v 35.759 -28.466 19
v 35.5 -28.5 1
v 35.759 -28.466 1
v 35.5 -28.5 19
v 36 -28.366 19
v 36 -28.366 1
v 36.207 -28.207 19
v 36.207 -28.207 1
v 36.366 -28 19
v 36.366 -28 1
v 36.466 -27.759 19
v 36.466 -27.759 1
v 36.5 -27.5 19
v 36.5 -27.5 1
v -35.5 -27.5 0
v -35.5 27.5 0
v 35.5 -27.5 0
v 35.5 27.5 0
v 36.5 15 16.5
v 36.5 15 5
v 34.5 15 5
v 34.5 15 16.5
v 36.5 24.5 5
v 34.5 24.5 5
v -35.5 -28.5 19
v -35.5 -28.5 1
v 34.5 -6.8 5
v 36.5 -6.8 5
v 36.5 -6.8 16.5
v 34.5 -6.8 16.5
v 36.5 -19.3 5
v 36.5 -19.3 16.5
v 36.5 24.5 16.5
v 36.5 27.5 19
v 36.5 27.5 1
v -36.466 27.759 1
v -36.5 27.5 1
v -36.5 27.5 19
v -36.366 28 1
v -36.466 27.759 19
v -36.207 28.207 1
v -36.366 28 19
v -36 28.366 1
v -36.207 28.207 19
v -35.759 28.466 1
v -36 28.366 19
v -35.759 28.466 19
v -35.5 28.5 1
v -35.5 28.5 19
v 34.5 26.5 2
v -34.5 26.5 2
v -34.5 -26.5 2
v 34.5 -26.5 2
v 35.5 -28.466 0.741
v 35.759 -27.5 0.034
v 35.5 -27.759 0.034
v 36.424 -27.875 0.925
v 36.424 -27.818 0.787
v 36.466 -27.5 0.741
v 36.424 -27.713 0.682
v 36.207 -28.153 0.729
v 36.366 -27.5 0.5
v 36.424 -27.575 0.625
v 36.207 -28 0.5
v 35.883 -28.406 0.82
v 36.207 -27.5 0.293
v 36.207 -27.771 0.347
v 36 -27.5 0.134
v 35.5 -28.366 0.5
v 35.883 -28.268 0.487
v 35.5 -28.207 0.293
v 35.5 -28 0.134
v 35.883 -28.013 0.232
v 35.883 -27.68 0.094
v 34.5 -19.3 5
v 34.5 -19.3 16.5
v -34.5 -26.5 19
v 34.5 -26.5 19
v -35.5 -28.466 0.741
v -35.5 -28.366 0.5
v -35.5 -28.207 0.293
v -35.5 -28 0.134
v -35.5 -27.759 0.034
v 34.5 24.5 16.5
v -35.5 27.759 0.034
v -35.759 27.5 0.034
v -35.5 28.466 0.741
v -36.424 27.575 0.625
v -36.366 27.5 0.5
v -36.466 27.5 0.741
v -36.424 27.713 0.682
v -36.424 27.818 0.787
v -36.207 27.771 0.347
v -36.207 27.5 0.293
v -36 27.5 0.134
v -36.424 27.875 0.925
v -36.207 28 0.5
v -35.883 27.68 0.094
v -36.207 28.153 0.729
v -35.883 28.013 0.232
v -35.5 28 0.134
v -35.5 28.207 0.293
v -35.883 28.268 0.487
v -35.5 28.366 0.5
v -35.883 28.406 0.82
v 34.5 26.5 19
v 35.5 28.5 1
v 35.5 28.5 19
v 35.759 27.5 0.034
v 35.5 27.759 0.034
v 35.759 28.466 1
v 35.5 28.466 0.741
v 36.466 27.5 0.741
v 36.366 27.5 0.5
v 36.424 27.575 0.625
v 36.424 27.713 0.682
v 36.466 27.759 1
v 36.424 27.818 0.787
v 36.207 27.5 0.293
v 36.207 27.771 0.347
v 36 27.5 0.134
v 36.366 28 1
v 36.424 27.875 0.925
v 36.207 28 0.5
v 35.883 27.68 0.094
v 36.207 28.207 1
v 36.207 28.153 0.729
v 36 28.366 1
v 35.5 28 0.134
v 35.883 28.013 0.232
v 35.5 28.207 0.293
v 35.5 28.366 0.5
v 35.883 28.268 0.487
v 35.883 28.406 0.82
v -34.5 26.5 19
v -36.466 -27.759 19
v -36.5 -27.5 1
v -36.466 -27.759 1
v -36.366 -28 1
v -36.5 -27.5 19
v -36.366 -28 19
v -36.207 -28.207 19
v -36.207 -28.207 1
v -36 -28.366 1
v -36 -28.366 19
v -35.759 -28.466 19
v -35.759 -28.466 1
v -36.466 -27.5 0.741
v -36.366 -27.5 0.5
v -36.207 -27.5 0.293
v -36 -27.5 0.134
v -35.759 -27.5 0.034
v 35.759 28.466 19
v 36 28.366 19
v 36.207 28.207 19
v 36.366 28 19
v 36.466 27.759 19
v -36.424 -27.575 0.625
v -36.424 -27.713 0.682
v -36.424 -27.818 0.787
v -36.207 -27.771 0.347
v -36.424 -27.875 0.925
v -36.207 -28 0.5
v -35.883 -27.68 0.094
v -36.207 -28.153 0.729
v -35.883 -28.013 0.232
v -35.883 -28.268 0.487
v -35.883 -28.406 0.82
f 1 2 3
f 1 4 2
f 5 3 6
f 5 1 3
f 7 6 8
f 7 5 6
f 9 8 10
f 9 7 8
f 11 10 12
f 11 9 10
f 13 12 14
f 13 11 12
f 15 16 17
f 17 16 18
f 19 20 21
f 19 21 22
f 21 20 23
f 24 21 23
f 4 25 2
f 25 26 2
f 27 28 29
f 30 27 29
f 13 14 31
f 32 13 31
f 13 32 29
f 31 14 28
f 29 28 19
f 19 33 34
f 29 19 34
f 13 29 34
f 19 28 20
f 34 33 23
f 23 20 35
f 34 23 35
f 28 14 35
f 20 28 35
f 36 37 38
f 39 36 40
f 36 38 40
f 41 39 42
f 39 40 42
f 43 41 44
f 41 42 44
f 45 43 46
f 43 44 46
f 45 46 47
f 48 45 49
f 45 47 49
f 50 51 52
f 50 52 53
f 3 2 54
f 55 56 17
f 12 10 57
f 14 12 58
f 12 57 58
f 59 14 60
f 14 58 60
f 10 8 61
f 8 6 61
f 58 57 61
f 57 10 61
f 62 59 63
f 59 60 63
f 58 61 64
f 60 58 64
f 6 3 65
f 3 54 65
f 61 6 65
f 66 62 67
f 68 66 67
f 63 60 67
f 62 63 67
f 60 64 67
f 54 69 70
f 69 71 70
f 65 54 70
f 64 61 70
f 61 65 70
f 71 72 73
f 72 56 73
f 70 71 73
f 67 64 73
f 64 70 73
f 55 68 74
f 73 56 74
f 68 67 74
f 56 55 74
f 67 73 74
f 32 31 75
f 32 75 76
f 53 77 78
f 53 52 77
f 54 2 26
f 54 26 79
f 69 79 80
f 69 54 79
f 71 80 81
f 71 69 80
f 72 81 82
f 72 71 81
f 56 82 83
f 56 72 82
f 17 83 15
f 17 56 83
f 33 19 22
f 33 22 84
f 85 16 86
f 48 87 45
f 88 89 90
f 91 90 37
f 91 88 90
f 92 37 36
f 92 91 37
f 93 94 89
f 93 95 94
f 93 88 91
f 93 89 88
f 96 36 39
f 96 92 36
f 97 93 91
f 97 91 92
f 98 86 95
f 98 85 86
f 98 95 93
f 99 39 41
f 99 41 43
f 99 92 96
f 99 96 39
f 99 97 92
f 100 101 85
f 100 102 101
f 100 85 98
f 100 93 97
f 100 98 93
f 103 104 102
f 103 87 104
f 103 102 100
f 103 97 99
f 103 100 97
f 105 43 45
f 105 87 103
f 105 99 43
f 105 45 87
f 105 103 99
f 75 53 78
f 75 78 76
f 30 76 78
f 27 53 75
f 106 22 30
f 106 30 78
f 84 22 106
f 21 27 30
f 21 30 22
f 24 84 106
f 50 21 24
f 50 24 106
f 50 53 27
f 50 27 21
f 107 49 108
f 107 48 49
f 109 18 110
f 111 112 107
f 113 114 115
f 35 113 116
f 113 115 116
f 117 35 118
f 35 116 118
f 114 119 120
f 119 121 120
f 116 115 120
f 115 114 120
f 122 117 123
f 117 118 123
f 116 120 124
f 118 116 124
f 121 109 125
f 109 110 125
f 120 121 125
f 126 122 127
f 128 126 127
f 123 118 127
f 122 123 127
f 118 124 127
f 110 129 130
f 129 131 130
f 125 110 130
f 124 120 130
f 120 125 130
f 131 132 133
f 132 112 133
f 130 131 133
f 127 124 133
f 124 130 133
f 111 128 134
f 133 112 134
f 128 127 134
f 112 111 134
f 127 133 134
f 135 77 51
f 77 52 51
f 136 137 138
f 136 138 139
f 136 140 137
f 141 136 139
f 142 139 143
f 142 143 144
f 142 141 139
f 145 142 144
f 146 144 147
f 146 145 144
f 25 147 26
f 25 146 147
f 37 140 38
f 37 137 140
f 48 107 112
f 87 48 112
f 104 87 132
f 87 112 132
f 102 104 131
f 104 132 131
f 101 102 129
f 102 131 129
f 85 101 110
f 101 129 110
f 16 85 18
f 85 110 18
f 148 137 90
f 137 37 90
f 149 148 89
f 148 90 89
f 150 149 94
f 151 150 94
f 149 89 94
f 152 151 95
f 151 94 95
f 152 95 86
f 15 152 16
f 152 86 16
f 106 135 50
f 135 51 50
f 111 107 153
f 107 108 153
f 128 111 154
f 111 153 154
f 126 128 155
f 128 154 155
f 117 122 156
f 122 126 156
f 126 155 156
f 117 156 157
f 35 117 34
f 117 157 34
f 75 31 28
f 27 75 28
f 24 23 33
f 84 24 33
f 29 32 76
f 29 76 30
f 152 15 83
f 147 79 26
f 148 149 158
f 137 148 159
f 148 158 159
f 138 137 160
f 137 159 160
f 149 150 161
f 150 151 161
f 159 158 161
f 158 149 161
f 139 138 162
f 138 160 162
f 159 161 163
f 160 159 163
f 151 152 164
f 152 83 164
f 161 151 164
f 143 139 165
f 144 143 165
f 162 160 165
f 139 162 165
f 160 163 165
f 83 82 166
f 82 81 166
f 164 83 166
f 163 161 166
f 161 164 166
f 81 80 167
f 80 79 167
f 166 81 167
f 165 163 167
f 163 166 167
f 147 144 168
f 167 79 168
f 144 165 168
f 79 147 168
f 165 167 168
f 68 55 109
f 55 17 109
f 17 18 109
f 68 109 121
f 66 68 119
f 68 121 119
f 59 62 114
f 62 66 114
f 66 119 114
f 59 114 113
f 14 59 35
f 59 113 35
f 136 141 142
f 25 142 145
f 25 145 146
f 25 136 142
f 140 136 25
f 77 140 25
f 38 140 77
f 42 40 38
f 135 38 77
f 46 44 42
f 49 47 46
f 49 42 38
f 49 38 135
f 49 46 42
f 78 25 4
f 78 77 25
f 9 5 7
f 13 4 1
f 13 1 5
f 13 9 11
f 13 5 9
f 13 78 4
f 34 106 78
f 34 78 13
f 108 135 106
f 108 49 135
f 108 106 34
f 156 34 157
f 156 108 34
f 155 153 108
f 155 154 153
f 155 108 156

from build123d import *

# Parameters (mm, degrees)
F0_W     = 73
F0_H     = 57
F1_DEPTH = 19
F2_T     = -2
F3_W     = 12.5
F3_H     = 11.5
F5_DEPTH = 25
F4_W     = 9.5
F4_H     = 11.5
F6_DEPTH = 25
F7_R     = 1


with BuildPart() as f1:
    # F0 (on Top) → F1 (new body)
    with BuildSketch(Plane.XY):
        Rectangle(F0_W, F0_H)
    extrude(amount=F1_DEPTH)

    # F2
    f2_openings = [f1.faces().sort_by_distance(p)[0] for p in [
        (0, 0, 19),
    ]]
    offset(amount=F2_T, openings=f2_openings)

    # F3 (on face) → F5 (cut)
    with BuildSketch(Plane.YZ.offset(36.5)):
        with Locations((-13.05, 10.75)):
            Rectangle(F3_W, F3_H)
    extrude(amount=-F5_DEPTH, mode=Mode.SUBTRACT)

    # F4 (on face) → F6 (cut)
    with BuildSketch(Plane.YZ.offset(36.5)):
        with Locations((19.75, 10.75)):
            Rectangle(F4_W, F4_H)
    extrude(amount=-F6_DEPTH, mode=Mode.SUBTRACT)

    # F7
    f7_edges = [f1.edges().sort_by_distance(p)[0] for p in [
        (0, -28.5, 0),
        (0, 28.5, 0),
        (-36.5, 0, 0),
        (36.5, -28.5, 9.5),
        (36.5, 0, 0),
        (-36.5, -28.5, 9.5),
        (36.5, 28.5, 9.5),
        (-36.5, 28.5, 9.5),
    ]]
    fillet(f7_edges, radius=F7_R)


solid = f1.part
